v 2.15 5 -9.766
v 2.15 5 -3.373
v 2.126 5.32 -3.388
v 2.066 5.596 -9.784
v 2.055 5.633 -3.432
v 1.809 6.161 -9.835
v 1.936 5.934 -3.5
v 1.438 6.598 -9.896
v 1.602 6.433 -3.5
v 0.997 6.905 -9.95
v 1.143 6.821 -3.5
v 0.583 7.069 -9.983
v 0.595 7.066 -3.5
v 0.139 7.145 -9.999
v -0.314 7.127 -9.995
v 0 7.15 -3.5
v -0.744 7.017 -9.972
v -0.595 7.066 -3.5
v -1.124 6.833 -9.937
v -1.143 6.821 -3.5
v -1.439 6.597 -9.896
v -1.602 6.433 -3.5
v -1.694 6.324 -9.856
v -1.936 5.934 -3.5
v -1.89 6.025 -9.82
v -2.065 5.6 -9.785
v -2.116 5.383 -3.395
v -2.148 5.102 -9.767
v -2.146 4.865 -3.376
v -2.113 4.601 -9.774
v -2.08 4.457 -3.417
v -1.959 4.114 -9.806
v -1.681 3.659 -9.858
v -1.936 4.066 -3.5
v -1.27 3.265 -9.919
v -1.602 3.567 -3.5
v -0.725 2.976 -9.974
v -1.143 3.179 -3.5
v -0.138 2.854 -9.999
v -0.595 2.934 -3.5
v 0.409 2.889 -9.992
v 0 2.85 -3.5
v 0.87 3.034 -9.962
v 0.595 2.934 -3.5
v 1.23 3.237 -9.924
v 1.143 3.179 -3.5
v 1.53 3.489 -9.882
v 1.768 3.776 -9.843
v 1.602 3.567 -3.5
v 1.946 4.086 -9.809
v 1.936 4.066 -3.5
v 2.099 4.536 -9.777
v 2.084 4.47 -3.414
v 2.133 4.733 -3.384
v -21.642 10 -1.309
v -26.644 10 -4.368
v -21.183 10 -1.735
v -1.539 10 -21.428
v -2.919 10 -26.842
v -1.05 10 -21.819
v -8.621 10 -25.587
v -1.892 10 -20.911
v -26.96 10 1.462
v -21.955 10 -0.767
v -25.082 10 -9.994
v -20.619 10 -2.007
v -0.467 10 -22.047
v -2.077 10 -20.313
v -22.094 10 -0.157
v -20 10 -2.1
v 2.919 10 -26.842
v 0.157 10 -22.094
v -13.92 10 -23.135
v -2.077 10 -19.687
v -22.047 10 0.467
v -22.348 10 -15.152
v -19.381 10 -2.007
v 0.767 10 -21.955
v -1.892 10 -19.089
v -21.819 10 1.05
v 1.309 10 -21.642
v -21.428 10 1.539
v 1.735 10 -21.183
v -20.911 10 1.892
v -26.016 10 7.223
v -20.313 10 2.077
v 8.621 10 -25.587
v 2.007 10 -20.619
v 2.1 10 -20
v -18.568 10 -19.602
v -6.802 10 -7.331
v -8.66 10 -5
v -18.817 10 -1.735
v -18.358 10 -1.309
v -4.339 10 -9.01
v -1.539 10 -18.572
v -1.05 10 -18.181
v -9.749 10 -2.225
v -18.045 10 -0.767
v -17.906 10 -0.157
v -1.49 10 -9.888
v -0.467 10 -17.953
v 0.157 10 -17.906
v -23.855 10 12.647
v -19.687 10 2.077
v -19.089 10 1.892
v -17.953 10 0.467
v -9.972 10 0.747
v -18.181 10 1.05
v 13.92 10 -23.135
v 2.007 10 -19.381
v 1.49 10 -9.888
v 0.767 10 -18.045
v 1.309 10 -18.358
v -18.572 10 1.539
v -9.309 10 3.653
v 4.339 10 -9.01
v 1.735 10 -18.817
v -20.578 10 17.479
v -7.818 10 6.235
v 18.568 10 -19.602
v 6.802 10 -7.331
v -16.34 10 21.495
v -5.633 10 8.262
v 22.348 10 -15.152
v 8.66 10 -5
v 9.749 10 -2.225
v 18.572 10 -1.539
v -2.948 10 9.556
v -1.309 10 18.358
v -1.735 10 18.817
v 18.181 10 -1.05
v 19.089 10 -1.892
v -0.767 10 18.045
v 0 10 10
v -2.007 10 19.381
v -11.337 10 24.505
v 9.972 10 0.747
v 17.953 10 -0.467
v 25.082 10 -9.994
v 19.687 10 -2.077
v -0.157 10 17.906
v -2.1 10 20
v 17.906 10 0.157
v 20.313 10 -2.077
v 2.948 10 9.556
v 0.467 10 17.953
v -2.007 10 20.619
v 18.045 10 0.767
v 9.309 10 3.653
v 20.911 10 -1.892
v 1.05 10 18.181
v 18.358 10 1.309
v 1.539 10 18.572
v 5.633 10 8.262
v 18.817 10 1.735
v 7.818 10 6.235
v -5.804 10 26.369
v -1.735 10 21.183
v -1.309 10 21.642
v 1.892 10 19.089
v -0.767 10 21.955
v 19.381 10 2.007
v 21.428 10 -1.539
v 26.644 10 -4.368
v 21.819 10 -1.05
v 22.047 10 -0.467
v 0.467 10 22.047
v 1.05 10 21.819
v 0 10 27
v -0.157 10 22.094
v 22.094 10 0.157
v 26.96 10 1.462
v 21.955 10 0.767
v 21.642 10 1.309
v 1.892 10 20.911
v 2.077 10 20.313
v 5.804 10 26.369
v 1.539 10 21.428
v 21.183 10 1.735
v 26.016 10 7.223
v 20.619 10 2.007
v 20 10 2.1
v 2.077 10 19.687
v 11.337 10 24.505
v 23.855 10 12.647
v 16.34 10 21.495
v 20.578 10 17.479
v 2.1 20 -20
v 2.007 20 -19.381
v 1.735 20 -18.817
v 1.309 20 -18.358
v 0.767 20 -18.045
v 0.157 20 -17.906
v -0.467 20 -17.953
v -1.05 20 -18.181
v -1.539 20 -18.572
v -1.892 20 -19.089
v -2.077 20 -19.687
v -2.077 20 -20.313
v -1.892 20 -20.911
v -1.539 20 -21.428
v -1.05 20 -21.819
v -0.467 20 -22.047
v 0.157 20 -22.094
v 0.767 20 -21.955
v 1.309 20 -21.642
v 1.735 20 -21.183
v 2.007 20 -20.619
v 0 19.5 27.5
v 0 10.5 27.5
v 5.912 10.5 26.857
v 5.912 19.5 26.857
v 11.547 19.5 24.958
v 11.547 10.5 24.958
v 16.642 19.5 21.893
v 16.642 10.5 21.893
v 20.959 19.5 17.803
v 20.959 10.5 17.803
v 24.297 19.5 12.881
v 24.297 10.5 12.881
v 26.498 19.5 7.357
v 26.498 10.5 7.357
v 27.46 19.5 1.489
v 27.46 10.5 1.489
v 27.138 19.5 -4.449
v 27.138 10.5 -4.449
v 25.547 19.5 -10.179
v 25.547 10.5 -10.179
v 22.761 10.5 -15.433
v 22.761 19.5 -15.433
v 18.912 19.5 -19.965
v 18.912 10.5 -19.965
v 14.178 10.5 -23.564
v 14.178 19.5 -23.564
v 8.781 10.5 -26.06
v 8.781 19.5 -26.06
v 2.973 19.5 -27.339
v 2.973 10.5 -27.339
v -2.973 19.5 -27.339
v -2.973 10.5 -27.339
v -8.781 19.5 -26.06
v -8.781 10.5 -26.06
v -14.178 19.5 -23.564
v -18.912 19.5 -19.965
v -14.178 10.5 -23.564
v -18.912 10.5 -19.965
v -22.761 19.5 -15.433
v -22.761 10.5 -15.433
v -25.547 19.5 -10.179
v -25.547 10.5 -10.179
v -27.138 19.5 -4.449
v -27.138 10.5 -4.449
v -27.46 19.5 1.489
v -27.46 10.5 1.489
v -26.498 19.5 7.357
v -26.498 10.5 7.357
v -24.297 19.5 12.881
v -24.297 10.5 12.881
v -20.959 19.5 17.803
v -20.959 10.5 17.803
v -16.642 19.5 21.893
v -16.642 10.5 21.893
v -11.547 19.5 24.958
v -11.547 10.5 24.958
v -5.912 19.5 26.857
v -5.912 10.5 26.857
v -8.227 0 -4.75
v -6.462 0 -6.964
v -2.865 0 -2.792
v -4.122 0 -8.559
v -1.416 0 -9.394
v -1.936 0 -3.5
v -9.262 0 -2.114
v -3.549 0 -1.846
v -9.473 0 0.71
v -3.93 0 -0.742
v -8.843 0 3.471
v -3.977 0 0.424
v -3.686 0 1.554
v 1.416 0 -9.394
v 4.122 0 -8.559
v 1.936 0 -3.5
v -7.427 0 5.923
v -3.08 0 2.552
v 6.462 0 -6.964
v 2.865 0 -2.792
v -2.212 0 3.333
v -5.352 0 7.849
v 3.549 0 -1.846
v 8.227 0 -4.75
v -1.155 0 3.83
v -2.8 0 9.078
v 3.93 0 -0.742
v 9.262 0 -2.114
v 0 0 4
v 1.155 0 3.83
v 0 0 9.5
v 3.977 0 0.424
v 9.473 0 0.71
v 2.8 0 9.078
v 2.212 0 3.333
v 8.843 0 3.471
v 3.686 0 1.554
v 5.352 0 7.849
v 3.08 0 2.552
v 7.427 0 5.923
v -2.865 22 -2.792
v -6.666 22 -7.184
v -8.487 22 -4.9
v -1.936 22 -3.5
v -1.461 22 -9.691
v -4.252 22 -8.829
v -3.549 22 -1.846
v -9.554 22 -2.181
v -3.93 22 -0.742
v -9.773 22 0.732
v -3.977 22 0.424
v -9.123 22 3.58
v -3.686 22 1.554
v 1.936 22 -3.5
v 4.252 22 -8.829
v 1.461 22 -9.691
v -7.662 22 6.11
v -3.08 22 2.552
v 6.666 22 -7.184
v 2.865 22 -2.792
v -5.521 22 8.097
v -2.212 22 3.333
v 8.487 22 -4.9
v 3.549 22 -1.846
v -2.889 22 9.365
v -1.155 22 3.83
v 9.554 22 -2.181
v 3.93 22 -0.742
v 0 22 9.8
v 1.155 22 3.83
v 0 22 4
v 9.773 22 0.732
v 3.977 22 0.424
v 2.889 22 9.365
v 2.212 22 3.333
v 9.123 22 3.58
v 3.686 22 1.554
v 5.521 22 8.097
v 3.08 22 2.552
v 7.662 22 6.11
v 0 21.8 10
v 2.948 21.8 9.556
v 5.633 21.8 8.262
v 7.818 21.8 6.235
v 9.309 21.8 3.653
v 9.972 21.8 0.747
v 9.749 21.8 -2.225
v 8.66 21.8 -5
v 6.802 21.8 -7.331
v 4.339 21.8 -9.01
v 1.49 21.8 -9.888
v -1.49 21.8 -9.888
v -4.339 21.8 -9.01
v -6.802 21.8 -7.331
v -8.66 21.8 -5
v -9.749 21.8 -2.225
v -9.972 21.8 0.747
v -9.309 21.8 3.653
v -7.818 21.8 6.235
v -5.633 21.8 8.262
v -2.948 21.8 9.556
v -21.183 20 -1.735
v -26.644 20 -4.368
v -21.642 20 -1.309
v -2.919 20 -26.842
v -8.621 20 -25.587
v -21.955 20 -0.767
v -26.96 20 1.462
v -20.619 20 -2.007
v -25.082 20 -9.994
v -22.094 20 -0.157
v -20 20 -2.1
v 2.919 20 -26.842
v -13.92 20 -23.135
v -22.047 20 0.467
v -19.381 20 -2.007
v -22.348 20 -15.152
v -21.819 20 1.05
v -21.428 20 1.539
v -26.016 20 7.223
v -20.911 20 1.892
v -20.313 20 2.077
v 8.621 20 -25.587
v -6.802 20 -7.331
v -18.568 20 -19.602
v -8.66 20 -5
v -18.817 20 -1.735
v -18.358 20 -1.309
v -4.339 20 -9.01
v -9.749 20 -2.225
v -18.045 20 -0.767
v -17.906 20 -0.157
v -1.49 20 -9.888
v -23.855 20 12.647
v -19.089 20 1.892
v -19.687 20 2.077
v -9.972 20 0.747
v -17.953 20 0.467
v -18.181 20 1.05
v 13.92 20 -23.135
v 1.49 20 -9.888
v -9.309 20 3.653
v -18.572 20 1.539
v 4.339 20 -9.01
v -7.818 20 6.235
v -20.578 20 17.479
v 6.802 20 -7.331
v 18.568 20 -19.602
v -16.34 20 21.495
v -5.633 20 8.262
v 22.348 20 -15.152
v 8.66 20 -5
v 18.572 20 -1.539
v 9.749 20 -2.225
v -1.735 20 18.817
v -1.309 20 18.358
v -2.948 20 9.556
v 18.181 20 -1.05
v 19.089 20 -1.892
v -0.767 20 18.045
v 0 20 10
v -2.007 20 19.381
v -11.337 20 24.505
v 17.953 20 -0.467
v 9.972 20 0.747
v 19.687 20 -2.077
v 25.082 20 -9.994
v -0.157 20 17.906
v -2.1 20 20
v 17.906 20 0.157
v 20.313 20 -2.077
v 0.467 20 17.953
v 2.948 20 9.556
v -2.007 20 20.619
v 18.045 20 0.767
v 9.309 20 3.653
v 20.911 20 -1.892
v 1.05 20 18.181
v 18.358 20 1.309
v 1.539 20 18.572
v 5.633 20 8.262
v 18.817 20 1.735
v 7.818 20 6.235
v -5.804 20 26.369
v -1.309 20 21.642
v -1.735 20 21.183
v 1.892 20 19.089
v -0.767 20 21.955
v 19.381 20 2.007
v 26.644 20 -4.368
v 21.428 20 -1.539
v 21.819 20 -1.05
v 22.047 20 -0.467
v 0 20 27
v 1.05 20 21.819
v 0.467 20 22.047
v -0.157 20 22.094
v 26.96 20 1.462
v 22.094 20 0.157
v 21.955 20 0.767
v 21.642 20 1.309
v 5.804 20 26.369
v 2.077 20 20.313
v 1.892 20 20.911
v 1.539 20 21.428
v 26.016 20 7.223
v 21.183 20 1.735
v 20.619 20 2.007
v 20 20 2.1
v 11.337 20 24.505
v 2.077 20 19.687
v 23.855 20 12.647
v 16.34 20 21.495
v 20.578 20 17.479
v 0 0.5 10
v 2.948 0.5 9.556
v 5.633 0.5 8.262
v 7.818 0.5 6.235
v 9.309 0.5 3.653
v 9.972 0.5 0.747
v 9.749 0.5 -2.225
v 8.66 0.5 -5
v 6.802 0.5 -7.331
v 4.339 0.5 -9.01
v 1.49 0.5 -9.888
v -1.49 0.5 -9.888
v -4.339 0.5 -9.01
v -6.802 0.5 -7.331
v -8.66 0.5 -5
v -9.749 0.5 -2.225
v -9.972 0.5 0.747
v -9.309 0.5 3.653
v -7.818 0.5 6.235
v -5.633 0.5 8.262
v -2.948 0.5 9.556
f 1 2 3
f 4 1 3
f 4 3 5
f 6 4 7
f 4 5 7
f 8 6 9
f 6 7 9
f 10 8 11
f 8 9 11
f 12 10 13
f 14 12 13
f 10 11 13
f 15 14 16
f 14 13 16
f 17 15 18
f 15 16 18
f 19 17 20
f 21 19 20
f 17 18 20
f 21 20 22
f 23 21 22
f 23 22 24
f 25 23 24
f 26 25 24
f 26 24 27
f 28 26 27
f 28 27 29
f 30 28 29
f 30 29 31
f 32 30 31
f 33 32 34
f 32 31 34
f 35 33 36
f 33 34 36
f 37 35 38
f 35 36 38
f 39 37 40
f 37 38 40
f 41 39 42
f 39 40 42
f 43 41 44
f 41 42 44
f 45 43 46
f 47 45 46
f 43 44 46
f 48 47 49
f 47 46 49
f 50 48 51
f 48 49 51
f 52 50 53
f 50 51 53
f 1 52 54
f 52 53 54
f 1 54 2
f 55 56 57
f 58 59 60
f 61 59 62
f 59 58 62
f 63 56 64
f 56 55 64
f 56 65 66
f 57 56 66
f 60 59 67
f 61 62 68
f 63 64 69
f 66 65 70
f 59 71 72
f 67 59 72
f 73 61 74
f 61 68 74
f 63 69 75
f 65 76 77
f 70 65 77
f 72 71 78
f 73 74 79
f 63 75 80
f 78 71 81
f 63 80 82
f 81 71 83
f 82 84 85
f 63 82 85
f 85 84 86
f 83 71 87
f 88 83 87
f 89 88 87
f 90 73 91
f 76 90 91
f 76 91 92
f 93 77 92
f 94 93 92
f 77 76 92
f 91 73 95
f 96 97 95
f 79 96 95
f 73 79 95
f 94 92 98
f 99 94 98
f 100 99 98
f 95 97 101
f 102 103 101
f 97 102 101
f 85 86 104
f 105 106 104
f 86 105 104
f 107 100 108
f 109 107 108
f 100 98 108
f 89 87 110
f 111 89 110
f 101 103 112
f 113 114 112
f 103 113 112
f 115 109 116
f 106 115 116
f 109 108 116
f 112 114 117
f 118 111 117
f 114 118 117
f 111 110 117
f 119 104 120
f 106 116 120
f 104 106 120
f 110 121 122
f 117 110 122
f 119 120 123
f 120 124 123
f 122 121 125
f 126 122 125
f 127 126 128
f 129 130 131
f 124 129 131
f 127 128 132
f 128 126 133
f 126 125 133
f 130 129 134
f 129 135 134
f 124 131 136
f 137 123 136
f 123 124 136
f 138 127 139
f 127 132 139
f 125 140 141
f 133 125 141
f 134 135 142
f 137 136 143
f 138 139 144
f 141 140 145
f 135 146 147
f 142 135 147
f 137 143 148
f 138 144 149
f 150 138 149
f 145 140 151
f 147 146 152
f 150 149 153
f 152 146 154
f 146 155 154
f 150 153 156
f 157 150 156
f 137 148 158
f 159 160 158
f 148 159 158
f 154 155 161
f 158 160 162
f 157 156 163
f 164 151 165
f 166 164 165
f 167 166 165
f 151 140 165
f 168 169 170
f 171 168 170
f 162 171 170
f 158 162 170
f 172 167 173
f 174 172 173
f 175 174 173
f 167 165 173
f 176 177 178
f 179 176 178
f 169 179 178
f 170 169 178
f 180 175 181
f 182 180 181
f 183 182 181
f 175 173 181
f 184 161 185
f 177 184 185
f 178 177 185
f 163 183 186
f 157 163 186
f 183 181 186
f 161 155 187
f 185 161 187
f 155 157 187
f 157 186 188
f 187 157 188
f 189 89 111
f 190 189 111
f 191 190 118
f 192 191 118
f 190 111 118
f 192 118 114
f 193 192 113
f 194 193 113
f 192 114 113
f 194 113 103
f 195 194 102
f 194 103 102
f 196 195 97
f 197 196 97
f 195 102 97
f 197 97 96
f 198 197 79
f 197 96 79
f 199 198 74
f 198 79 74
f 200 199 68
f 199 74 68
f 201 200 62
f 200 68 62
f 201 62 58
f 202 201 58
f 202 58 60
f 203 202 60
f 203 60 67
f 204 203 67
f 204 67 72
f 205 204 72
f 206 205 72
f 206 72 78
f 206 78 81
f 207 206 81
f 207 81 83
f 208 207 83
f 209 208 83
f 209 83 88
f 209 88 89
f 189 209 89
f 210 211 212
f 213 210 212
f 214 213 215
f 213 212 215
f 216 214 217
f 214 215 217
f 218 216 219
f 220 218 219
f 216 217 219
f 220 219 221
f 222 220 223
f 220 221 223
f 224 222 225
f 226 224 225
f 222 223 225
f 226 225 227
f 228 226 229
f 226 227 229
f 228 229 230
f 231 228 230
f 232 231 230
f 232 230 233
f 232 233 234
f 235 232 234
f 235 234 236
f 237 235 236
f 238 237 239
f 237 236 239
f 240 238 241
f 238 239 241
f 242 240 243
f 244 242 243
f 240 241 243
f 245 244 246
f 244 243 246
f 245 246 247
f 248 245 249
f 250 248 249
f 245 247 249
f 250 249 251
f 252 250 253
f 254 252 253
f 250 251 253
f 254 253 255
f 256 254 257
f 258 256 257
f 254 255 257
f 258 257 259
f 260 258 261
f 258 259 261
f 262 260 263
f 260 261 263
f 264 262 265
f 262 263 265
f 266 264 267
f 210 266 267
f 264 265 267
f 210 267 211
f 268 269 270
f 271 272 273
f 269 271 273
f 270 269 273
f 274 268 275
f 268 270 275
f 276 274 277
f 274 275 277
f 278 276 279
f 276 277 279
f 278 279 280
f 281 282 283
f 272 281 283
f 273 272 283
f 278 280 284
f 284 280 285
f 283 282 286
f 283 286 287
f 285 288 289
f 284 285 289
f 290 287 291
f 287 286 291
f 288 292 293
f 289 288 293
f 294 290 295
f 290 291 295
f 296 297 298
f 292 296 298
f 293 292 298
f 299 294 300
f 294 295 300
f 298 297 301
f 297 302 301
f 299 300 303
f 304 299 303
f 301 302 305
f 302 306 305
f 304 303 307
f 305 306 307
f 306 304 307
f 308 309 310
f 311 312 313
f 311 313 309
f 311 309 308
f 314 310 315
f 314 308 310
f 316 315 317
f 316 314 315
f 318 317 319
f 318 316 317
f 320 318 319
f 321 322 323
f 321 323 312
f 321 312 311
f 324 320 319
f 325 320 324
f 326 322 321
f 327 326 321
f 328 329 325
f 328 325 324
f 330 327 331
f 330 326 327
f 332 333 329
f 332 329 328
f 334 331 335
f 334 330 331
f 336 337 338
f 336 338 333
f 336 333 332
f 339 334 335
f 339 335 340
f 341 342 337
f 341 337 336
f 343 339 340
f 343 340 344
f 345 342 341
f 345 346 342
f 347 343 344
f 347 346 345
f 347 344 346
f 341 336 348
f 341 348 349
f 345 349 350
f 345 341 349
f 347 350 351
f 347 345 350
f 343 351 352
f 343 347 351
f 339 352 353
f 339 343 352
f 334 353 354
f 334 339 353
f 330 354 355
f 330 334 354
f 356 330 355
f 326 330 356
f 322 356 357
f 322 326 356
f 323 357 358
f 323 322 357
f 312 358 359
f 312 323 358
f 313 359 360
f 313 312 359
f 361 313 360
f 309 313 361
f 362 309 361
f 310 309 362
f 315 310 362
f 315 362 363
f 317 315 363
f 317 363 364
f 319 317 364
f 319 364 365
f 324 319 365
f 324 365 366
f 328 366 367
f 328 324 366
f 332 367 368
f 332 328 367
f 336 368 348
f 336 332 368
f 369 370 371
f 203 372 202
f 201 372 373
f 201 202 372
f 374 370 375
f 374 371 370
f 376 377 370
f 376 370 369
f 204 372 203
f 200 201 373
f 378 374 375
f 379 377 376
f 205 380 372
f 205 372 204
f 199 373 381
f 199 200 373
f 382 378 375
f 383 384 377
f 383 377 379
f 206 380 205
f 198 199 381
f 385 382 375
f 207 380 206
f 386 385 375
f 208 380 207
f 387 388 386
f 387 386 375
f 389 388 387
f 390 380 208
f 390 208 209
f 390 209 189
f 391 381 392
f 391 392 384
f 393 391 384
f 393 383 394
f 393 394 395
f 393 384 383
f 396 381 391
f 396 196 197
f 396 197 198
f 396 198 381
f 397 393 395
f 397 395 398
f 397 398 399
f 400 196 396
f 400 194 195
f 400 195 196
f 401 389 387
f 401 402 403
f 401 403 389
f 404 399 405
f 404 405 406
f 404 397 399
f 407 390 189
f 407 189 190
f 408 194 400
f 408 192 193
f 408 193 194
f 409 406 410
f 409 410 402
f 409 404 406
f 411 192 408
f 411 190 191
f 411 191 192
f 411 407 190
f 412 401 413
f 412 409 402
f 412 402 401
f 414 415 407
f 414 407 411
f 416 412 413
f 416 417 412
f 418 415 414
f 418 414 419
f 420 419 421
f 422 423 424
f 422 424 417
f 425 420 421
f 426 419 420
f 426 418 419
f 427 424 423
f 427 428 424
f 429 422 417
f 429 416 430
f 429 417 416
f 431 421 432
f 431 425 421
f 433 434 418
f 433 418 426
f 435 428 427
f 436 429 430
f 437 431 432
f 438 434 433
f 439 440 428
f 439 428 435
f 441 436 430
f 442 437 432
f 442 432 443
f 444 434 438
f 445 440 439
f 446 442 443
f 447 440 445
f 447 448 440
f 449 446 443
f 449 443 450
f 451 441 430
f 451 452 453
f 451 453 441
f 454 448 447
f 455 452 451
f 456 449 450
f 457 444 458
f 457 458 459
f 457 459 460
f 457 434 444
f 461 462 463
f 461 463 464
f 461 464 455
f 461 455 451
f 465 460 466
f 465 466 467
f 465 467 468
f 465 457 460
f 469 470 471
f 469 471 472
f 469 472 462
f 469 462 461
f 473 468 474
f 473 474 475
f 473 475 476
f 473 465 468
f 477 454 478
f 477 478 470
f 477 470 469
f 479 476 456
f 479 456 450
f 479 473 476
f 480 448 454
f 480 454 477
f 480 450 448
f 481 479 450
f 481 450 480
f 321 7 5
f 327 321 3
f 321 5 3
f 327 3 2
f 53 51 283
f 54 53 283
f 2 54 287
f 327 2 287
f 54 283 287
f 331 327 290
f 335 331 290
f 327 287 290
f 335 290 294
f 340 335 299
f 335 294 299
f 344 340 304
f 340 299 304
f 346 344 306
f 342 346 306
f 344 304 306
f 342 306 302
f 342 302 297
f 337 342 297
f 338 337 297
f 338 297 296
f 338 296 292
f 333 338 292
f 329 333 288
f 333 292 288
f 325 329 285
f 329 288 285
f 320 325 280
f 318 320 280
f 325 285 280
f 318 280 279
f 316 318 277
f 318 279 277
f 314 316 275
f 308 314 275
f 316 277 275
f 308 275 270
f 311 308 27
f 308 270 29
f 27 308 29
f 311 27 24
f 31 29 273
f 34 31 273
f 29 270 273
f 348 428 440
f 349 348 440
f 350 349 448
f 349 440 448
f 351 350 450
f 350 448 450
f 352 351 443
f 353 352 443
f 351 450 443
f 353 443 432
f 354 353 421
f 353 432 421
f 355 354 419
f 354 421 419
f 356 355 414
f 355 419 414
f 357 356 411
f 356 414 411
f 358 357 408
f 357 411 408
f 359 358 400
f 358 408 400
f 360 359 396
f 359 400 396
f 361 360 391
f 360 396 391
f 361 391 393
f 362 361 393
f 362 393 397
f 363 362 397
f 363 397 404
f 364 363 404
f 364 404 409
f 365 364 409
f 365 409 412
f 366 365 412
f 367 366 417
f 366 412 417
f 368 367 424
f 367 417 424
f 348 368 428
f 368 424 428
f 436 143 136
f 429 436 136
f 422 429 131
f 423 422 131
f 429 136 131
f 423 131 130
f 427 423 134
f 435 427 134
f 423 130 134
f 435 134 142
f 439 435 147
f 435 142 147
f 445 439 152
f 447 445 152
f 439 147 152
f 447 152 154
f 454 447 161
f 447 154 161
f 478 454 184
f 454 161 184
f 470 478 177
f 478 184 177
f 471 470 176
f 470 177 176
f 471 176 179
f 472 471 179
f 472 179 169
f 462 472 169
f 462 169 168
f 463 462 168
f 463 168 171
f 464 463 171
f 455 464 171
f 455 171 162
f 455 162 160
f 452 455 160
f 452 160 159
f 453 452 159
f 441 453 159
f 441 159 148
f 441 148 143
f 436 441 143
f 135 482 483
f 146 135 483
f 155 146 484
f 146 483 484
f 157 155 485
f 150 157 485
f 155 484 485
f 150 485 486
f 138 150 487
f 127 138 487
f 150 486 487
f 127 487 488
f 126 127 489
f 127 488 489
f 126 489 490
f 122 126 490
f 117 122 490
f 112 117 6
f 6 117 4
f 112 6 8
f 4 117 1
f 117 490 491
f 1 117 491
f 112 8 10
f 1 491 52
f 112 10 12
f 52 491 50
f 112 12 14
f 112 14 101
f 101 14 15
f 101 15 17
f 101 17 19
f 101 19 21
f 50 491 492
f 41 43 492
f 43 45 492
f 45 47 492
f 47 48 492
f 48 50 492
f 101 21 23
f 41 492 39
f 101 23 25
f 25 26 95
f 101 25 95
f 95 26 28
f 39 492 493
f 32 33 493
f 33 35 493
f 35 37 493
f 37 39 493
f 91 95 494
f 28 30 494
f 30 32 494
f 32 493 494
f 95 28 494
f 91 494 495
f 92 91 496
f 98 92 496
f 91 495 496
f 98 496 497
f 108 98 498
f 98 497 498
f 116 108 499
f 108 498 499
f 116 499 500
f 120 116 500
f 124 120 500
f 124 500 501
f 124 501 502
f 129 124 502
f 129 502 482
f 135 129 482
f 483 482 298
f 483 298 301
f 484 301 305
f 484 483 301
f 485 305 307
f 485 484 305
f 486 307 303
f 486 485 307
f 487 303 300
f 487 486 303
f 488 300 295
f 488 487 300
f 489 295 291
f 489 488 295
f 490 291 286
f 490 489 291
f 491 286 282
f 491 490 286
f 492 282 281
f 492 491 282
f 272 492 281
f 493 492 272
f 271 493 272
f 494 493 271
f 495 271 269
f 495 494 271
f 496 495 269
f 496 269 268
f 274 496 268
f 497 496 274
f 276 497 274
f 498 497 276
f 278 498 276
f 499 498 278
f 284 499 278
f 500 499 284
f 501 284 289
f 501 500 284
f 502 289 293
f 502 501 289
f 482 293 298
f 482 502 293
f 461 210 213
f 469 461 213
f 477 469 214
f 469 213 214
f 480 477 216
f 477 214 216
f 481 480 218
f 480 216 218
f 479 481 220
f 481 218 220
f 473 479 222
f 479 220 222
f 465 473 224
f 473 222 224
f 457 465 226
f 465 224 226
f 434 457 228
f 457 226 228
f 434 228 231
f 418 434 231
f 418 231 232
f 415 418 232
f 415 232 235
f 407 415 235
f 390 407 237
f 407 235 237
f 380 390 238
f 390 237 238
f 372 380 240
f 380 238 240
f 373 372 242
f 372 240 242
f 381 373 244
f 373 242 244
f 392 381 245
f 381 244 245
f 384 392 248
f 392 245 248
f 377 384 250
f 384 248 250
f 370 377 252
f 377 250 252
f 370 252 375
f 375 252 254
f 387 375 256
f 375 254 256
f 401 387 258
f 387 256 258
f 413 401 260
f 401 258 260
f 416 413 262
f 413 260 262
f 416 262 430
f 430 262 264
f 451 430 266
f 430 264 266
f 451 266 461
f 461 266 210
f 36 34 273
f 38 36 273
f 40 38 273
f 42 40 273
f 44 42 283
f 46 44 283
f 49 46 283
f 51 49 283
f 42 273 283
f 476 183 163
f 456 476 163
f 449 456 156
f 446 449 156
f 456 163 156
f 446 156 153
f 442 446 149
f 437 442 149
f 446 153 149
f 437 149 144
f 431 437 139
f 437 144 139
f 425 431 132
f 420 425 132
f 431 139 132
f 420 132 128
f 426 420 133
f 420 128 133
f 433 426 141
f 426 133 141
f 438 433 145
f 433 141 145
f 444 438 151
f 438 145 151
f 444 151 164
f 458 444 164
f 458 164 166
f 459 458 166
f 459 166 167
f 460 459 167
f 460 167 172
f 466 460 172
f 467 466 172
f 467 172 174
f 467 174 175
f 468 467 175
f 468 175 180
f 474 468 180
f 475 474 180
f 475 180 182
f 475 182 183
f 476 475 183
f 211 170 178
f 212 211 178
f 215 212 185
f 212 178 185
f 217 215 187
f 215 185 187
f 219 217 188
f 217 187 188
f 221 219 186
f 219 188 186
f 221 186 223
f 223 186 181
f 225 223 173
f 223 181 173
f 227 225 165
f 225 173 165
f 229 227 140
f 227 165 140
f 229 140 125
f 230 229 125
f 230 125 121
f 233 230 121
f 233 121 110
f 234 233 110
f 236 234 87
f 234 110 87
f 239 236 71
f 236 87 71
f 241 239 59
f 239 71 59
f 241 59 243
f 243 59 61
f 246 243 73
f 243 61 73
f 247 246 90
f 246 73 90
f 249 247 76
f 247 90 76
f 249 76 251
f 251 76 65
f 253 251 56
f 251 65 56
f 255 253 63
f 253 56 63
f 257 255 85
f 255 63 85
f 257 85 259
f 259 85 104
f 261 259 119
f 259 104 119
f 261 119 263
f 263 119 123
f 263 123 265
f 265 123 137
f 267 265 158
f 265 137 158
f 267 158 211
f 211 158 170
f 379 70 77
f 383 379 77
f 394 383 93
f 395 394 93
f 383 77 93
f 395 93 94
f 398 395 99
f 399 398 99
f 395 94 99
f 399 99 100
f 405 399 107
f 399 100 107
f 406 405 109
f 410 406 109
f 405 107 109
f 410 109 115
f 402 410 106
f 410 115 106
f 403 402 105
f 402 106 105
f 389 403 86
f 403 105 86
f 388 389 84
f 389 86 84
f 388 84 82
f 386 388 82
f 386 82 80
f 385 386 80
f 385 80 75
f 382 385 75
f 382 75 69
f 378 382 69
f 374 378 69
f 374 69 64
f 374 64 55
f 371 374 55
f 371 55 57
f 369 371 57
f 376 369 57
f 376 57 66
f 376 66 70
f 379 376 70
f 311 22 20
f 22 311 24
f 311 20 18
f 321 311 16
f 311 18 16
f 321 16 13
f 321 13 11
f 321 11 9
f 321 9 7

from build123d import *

# Parameters (mm, degrees)
ESQUISSE1_R                               = 10
BOSS_EXTRU_1_DEPTH                        = 10
D_GAGEMENT_M41_D                          = 4.3
D_GAGEMENT_M41_DEPTH                      = 8
D_GAGEMENT_M41_TIP                        = 1.291850331
ESQUISSE4_R                               = 27.5
BOSS_EXTRU_2_DEPTH                        = 10
ESQUISSE5_R                               = 10
BOSS_EXTRU_3_DEPTH                        = 2
TROU_POUR_TARAUDAGE_POUR_TROU_TARAUD_M5_D = 4.2
R_P_TITION_CIRCULAIRE1_COUNT              = 4
CHANFREIN1_SIZE                           = 0.5
CHANFREIN2_SIZE                           = 0.2


with BuildPart() as part:
    # Esquisse1 → Boss.-Extru.1 (new body)
    with BuildSketch(Plane(origin=(0, 0, 0), x_dir=(1, 0, 0), z_dir=(0, 1, 0))):
        Circle(ESQUISSE1_R)
        with BuildLine():
            Line((-1.936491673, 3.5), (1.936491673, 3.5))
            ThreePointArc((1.936491673, 3.5), (0, -4), (-1.936491673, 3.5))
        make_face(mode=Mode.SUBTRACT)
    extrude(amount=BOSS_EXTRU_1_DEPTH)

    # Dégagement M41
    with Locations(Plane(origin=(0, 0, -10), x_dir=(-1, 0, 0), z_dir=(0, 0, -1))):
        with Locations((0, 5)):
            Hole(D_GAGEMENT_M41_D / 2, depth=D_GAGEMENT_M41_DEPTH)
            with Locations((0, 0, -(D_GAGEMENT_M41_DEPTH + D_GAGEMENT_M41_TIP / 2))):  # 118° drill point
                Cone(0, D_GAGEMENT_M41_D / 2, D_GAGEMENT_M41_TIP, mode=Mode.SUBTRACT)

    # Esquisse4 → Boss.-Extru.2 (add)
    with BuildSketch(Plane(origin=(0, 10, 0), x_dir=(1, 0, 0), z_dir=(0, 1, 0))):
        Circle(ESQUISSE4_R)
        with BuildLine():
            Line((-1.936491673, 3.5), (1.936491673, 3.5))
            ThreePointArc((1.936491673, 3.5), (0, -4), (-1.936491673, 3.5))
        make_face(mode=Mode.SUBTRACT)
    extrude(amount=BOSS_EXTRU_2_DEPTH)

    # Esquisse5 → Boss.-Extru.3 (add)
    with BuildSketch(Plane(origin=(0, 20, 0), x_dir=(1, 0, 0), z_dir=(0, 1, 0))):
        Circle(ESQUISSE5_R)
        with BuildLine():
            Line((-1.936491673, 3.5), (1.936491673, 3.5))
            ThreePointArc((1.936491673, 3.5), (0, -4), (-1.936491673, 3.5))
        make_face(mode=Mode.SUBTRACT)
    extrude(amount=BOSS_EXTRU_3_DEPTH)

    # Trou pour taraudage pour trou taraudé M51 (through all)
    with Locations(Plane(origin=(0, 20, 0), x_dir=(1, 0, 0), z_dir=(0, 1, 0))):
        with Locations((0, -20)):
            trou_pour_taraudage_pour_trou_taraud_m5 = Hole(TROU_POUR_TARAUDAGE_POUR_TROU_TARAUD_M5_D / 2)

    # Répétition circulaire1: Trou pour taraudage pour trou taraudé M51 ×4 about axis
    r_p_tition_circulaire1_axis = Axis((0, 22, 0), (0, -1, 0))
    for i in range(1, R_P_TITION_CIRCULAIRE1_COUNT):
        add(trou_pour_taraudage_pour_trou_taraud_m5.rotate(r_p_tition_circulaire1_axis, i * 360 / R_P_TITION_CIRCULAIRE1_COUNT), mode=Mode.SUBTRACT)

    # Chanfrein1
    chanfrein1_edges = [part.edges().sort_by_distance(p)[0] for p in [
        (-10, 0, 0),
        (-27.5, 10, 0),
        (-27.5, 20, 0),
    ]]
    chamfer(chanfrein1_edges, length=CHANFREIN1_SIZE)

    # Chanfrein2
    chanfrein2_edges = [part.edges().sort_by_distance(p)[0] for p in [
        (-10, 22, 0),
    ]]
    chamfer(chanfrein2_edges, length=CHANFREIN2_SIZE)


solid = part.part
